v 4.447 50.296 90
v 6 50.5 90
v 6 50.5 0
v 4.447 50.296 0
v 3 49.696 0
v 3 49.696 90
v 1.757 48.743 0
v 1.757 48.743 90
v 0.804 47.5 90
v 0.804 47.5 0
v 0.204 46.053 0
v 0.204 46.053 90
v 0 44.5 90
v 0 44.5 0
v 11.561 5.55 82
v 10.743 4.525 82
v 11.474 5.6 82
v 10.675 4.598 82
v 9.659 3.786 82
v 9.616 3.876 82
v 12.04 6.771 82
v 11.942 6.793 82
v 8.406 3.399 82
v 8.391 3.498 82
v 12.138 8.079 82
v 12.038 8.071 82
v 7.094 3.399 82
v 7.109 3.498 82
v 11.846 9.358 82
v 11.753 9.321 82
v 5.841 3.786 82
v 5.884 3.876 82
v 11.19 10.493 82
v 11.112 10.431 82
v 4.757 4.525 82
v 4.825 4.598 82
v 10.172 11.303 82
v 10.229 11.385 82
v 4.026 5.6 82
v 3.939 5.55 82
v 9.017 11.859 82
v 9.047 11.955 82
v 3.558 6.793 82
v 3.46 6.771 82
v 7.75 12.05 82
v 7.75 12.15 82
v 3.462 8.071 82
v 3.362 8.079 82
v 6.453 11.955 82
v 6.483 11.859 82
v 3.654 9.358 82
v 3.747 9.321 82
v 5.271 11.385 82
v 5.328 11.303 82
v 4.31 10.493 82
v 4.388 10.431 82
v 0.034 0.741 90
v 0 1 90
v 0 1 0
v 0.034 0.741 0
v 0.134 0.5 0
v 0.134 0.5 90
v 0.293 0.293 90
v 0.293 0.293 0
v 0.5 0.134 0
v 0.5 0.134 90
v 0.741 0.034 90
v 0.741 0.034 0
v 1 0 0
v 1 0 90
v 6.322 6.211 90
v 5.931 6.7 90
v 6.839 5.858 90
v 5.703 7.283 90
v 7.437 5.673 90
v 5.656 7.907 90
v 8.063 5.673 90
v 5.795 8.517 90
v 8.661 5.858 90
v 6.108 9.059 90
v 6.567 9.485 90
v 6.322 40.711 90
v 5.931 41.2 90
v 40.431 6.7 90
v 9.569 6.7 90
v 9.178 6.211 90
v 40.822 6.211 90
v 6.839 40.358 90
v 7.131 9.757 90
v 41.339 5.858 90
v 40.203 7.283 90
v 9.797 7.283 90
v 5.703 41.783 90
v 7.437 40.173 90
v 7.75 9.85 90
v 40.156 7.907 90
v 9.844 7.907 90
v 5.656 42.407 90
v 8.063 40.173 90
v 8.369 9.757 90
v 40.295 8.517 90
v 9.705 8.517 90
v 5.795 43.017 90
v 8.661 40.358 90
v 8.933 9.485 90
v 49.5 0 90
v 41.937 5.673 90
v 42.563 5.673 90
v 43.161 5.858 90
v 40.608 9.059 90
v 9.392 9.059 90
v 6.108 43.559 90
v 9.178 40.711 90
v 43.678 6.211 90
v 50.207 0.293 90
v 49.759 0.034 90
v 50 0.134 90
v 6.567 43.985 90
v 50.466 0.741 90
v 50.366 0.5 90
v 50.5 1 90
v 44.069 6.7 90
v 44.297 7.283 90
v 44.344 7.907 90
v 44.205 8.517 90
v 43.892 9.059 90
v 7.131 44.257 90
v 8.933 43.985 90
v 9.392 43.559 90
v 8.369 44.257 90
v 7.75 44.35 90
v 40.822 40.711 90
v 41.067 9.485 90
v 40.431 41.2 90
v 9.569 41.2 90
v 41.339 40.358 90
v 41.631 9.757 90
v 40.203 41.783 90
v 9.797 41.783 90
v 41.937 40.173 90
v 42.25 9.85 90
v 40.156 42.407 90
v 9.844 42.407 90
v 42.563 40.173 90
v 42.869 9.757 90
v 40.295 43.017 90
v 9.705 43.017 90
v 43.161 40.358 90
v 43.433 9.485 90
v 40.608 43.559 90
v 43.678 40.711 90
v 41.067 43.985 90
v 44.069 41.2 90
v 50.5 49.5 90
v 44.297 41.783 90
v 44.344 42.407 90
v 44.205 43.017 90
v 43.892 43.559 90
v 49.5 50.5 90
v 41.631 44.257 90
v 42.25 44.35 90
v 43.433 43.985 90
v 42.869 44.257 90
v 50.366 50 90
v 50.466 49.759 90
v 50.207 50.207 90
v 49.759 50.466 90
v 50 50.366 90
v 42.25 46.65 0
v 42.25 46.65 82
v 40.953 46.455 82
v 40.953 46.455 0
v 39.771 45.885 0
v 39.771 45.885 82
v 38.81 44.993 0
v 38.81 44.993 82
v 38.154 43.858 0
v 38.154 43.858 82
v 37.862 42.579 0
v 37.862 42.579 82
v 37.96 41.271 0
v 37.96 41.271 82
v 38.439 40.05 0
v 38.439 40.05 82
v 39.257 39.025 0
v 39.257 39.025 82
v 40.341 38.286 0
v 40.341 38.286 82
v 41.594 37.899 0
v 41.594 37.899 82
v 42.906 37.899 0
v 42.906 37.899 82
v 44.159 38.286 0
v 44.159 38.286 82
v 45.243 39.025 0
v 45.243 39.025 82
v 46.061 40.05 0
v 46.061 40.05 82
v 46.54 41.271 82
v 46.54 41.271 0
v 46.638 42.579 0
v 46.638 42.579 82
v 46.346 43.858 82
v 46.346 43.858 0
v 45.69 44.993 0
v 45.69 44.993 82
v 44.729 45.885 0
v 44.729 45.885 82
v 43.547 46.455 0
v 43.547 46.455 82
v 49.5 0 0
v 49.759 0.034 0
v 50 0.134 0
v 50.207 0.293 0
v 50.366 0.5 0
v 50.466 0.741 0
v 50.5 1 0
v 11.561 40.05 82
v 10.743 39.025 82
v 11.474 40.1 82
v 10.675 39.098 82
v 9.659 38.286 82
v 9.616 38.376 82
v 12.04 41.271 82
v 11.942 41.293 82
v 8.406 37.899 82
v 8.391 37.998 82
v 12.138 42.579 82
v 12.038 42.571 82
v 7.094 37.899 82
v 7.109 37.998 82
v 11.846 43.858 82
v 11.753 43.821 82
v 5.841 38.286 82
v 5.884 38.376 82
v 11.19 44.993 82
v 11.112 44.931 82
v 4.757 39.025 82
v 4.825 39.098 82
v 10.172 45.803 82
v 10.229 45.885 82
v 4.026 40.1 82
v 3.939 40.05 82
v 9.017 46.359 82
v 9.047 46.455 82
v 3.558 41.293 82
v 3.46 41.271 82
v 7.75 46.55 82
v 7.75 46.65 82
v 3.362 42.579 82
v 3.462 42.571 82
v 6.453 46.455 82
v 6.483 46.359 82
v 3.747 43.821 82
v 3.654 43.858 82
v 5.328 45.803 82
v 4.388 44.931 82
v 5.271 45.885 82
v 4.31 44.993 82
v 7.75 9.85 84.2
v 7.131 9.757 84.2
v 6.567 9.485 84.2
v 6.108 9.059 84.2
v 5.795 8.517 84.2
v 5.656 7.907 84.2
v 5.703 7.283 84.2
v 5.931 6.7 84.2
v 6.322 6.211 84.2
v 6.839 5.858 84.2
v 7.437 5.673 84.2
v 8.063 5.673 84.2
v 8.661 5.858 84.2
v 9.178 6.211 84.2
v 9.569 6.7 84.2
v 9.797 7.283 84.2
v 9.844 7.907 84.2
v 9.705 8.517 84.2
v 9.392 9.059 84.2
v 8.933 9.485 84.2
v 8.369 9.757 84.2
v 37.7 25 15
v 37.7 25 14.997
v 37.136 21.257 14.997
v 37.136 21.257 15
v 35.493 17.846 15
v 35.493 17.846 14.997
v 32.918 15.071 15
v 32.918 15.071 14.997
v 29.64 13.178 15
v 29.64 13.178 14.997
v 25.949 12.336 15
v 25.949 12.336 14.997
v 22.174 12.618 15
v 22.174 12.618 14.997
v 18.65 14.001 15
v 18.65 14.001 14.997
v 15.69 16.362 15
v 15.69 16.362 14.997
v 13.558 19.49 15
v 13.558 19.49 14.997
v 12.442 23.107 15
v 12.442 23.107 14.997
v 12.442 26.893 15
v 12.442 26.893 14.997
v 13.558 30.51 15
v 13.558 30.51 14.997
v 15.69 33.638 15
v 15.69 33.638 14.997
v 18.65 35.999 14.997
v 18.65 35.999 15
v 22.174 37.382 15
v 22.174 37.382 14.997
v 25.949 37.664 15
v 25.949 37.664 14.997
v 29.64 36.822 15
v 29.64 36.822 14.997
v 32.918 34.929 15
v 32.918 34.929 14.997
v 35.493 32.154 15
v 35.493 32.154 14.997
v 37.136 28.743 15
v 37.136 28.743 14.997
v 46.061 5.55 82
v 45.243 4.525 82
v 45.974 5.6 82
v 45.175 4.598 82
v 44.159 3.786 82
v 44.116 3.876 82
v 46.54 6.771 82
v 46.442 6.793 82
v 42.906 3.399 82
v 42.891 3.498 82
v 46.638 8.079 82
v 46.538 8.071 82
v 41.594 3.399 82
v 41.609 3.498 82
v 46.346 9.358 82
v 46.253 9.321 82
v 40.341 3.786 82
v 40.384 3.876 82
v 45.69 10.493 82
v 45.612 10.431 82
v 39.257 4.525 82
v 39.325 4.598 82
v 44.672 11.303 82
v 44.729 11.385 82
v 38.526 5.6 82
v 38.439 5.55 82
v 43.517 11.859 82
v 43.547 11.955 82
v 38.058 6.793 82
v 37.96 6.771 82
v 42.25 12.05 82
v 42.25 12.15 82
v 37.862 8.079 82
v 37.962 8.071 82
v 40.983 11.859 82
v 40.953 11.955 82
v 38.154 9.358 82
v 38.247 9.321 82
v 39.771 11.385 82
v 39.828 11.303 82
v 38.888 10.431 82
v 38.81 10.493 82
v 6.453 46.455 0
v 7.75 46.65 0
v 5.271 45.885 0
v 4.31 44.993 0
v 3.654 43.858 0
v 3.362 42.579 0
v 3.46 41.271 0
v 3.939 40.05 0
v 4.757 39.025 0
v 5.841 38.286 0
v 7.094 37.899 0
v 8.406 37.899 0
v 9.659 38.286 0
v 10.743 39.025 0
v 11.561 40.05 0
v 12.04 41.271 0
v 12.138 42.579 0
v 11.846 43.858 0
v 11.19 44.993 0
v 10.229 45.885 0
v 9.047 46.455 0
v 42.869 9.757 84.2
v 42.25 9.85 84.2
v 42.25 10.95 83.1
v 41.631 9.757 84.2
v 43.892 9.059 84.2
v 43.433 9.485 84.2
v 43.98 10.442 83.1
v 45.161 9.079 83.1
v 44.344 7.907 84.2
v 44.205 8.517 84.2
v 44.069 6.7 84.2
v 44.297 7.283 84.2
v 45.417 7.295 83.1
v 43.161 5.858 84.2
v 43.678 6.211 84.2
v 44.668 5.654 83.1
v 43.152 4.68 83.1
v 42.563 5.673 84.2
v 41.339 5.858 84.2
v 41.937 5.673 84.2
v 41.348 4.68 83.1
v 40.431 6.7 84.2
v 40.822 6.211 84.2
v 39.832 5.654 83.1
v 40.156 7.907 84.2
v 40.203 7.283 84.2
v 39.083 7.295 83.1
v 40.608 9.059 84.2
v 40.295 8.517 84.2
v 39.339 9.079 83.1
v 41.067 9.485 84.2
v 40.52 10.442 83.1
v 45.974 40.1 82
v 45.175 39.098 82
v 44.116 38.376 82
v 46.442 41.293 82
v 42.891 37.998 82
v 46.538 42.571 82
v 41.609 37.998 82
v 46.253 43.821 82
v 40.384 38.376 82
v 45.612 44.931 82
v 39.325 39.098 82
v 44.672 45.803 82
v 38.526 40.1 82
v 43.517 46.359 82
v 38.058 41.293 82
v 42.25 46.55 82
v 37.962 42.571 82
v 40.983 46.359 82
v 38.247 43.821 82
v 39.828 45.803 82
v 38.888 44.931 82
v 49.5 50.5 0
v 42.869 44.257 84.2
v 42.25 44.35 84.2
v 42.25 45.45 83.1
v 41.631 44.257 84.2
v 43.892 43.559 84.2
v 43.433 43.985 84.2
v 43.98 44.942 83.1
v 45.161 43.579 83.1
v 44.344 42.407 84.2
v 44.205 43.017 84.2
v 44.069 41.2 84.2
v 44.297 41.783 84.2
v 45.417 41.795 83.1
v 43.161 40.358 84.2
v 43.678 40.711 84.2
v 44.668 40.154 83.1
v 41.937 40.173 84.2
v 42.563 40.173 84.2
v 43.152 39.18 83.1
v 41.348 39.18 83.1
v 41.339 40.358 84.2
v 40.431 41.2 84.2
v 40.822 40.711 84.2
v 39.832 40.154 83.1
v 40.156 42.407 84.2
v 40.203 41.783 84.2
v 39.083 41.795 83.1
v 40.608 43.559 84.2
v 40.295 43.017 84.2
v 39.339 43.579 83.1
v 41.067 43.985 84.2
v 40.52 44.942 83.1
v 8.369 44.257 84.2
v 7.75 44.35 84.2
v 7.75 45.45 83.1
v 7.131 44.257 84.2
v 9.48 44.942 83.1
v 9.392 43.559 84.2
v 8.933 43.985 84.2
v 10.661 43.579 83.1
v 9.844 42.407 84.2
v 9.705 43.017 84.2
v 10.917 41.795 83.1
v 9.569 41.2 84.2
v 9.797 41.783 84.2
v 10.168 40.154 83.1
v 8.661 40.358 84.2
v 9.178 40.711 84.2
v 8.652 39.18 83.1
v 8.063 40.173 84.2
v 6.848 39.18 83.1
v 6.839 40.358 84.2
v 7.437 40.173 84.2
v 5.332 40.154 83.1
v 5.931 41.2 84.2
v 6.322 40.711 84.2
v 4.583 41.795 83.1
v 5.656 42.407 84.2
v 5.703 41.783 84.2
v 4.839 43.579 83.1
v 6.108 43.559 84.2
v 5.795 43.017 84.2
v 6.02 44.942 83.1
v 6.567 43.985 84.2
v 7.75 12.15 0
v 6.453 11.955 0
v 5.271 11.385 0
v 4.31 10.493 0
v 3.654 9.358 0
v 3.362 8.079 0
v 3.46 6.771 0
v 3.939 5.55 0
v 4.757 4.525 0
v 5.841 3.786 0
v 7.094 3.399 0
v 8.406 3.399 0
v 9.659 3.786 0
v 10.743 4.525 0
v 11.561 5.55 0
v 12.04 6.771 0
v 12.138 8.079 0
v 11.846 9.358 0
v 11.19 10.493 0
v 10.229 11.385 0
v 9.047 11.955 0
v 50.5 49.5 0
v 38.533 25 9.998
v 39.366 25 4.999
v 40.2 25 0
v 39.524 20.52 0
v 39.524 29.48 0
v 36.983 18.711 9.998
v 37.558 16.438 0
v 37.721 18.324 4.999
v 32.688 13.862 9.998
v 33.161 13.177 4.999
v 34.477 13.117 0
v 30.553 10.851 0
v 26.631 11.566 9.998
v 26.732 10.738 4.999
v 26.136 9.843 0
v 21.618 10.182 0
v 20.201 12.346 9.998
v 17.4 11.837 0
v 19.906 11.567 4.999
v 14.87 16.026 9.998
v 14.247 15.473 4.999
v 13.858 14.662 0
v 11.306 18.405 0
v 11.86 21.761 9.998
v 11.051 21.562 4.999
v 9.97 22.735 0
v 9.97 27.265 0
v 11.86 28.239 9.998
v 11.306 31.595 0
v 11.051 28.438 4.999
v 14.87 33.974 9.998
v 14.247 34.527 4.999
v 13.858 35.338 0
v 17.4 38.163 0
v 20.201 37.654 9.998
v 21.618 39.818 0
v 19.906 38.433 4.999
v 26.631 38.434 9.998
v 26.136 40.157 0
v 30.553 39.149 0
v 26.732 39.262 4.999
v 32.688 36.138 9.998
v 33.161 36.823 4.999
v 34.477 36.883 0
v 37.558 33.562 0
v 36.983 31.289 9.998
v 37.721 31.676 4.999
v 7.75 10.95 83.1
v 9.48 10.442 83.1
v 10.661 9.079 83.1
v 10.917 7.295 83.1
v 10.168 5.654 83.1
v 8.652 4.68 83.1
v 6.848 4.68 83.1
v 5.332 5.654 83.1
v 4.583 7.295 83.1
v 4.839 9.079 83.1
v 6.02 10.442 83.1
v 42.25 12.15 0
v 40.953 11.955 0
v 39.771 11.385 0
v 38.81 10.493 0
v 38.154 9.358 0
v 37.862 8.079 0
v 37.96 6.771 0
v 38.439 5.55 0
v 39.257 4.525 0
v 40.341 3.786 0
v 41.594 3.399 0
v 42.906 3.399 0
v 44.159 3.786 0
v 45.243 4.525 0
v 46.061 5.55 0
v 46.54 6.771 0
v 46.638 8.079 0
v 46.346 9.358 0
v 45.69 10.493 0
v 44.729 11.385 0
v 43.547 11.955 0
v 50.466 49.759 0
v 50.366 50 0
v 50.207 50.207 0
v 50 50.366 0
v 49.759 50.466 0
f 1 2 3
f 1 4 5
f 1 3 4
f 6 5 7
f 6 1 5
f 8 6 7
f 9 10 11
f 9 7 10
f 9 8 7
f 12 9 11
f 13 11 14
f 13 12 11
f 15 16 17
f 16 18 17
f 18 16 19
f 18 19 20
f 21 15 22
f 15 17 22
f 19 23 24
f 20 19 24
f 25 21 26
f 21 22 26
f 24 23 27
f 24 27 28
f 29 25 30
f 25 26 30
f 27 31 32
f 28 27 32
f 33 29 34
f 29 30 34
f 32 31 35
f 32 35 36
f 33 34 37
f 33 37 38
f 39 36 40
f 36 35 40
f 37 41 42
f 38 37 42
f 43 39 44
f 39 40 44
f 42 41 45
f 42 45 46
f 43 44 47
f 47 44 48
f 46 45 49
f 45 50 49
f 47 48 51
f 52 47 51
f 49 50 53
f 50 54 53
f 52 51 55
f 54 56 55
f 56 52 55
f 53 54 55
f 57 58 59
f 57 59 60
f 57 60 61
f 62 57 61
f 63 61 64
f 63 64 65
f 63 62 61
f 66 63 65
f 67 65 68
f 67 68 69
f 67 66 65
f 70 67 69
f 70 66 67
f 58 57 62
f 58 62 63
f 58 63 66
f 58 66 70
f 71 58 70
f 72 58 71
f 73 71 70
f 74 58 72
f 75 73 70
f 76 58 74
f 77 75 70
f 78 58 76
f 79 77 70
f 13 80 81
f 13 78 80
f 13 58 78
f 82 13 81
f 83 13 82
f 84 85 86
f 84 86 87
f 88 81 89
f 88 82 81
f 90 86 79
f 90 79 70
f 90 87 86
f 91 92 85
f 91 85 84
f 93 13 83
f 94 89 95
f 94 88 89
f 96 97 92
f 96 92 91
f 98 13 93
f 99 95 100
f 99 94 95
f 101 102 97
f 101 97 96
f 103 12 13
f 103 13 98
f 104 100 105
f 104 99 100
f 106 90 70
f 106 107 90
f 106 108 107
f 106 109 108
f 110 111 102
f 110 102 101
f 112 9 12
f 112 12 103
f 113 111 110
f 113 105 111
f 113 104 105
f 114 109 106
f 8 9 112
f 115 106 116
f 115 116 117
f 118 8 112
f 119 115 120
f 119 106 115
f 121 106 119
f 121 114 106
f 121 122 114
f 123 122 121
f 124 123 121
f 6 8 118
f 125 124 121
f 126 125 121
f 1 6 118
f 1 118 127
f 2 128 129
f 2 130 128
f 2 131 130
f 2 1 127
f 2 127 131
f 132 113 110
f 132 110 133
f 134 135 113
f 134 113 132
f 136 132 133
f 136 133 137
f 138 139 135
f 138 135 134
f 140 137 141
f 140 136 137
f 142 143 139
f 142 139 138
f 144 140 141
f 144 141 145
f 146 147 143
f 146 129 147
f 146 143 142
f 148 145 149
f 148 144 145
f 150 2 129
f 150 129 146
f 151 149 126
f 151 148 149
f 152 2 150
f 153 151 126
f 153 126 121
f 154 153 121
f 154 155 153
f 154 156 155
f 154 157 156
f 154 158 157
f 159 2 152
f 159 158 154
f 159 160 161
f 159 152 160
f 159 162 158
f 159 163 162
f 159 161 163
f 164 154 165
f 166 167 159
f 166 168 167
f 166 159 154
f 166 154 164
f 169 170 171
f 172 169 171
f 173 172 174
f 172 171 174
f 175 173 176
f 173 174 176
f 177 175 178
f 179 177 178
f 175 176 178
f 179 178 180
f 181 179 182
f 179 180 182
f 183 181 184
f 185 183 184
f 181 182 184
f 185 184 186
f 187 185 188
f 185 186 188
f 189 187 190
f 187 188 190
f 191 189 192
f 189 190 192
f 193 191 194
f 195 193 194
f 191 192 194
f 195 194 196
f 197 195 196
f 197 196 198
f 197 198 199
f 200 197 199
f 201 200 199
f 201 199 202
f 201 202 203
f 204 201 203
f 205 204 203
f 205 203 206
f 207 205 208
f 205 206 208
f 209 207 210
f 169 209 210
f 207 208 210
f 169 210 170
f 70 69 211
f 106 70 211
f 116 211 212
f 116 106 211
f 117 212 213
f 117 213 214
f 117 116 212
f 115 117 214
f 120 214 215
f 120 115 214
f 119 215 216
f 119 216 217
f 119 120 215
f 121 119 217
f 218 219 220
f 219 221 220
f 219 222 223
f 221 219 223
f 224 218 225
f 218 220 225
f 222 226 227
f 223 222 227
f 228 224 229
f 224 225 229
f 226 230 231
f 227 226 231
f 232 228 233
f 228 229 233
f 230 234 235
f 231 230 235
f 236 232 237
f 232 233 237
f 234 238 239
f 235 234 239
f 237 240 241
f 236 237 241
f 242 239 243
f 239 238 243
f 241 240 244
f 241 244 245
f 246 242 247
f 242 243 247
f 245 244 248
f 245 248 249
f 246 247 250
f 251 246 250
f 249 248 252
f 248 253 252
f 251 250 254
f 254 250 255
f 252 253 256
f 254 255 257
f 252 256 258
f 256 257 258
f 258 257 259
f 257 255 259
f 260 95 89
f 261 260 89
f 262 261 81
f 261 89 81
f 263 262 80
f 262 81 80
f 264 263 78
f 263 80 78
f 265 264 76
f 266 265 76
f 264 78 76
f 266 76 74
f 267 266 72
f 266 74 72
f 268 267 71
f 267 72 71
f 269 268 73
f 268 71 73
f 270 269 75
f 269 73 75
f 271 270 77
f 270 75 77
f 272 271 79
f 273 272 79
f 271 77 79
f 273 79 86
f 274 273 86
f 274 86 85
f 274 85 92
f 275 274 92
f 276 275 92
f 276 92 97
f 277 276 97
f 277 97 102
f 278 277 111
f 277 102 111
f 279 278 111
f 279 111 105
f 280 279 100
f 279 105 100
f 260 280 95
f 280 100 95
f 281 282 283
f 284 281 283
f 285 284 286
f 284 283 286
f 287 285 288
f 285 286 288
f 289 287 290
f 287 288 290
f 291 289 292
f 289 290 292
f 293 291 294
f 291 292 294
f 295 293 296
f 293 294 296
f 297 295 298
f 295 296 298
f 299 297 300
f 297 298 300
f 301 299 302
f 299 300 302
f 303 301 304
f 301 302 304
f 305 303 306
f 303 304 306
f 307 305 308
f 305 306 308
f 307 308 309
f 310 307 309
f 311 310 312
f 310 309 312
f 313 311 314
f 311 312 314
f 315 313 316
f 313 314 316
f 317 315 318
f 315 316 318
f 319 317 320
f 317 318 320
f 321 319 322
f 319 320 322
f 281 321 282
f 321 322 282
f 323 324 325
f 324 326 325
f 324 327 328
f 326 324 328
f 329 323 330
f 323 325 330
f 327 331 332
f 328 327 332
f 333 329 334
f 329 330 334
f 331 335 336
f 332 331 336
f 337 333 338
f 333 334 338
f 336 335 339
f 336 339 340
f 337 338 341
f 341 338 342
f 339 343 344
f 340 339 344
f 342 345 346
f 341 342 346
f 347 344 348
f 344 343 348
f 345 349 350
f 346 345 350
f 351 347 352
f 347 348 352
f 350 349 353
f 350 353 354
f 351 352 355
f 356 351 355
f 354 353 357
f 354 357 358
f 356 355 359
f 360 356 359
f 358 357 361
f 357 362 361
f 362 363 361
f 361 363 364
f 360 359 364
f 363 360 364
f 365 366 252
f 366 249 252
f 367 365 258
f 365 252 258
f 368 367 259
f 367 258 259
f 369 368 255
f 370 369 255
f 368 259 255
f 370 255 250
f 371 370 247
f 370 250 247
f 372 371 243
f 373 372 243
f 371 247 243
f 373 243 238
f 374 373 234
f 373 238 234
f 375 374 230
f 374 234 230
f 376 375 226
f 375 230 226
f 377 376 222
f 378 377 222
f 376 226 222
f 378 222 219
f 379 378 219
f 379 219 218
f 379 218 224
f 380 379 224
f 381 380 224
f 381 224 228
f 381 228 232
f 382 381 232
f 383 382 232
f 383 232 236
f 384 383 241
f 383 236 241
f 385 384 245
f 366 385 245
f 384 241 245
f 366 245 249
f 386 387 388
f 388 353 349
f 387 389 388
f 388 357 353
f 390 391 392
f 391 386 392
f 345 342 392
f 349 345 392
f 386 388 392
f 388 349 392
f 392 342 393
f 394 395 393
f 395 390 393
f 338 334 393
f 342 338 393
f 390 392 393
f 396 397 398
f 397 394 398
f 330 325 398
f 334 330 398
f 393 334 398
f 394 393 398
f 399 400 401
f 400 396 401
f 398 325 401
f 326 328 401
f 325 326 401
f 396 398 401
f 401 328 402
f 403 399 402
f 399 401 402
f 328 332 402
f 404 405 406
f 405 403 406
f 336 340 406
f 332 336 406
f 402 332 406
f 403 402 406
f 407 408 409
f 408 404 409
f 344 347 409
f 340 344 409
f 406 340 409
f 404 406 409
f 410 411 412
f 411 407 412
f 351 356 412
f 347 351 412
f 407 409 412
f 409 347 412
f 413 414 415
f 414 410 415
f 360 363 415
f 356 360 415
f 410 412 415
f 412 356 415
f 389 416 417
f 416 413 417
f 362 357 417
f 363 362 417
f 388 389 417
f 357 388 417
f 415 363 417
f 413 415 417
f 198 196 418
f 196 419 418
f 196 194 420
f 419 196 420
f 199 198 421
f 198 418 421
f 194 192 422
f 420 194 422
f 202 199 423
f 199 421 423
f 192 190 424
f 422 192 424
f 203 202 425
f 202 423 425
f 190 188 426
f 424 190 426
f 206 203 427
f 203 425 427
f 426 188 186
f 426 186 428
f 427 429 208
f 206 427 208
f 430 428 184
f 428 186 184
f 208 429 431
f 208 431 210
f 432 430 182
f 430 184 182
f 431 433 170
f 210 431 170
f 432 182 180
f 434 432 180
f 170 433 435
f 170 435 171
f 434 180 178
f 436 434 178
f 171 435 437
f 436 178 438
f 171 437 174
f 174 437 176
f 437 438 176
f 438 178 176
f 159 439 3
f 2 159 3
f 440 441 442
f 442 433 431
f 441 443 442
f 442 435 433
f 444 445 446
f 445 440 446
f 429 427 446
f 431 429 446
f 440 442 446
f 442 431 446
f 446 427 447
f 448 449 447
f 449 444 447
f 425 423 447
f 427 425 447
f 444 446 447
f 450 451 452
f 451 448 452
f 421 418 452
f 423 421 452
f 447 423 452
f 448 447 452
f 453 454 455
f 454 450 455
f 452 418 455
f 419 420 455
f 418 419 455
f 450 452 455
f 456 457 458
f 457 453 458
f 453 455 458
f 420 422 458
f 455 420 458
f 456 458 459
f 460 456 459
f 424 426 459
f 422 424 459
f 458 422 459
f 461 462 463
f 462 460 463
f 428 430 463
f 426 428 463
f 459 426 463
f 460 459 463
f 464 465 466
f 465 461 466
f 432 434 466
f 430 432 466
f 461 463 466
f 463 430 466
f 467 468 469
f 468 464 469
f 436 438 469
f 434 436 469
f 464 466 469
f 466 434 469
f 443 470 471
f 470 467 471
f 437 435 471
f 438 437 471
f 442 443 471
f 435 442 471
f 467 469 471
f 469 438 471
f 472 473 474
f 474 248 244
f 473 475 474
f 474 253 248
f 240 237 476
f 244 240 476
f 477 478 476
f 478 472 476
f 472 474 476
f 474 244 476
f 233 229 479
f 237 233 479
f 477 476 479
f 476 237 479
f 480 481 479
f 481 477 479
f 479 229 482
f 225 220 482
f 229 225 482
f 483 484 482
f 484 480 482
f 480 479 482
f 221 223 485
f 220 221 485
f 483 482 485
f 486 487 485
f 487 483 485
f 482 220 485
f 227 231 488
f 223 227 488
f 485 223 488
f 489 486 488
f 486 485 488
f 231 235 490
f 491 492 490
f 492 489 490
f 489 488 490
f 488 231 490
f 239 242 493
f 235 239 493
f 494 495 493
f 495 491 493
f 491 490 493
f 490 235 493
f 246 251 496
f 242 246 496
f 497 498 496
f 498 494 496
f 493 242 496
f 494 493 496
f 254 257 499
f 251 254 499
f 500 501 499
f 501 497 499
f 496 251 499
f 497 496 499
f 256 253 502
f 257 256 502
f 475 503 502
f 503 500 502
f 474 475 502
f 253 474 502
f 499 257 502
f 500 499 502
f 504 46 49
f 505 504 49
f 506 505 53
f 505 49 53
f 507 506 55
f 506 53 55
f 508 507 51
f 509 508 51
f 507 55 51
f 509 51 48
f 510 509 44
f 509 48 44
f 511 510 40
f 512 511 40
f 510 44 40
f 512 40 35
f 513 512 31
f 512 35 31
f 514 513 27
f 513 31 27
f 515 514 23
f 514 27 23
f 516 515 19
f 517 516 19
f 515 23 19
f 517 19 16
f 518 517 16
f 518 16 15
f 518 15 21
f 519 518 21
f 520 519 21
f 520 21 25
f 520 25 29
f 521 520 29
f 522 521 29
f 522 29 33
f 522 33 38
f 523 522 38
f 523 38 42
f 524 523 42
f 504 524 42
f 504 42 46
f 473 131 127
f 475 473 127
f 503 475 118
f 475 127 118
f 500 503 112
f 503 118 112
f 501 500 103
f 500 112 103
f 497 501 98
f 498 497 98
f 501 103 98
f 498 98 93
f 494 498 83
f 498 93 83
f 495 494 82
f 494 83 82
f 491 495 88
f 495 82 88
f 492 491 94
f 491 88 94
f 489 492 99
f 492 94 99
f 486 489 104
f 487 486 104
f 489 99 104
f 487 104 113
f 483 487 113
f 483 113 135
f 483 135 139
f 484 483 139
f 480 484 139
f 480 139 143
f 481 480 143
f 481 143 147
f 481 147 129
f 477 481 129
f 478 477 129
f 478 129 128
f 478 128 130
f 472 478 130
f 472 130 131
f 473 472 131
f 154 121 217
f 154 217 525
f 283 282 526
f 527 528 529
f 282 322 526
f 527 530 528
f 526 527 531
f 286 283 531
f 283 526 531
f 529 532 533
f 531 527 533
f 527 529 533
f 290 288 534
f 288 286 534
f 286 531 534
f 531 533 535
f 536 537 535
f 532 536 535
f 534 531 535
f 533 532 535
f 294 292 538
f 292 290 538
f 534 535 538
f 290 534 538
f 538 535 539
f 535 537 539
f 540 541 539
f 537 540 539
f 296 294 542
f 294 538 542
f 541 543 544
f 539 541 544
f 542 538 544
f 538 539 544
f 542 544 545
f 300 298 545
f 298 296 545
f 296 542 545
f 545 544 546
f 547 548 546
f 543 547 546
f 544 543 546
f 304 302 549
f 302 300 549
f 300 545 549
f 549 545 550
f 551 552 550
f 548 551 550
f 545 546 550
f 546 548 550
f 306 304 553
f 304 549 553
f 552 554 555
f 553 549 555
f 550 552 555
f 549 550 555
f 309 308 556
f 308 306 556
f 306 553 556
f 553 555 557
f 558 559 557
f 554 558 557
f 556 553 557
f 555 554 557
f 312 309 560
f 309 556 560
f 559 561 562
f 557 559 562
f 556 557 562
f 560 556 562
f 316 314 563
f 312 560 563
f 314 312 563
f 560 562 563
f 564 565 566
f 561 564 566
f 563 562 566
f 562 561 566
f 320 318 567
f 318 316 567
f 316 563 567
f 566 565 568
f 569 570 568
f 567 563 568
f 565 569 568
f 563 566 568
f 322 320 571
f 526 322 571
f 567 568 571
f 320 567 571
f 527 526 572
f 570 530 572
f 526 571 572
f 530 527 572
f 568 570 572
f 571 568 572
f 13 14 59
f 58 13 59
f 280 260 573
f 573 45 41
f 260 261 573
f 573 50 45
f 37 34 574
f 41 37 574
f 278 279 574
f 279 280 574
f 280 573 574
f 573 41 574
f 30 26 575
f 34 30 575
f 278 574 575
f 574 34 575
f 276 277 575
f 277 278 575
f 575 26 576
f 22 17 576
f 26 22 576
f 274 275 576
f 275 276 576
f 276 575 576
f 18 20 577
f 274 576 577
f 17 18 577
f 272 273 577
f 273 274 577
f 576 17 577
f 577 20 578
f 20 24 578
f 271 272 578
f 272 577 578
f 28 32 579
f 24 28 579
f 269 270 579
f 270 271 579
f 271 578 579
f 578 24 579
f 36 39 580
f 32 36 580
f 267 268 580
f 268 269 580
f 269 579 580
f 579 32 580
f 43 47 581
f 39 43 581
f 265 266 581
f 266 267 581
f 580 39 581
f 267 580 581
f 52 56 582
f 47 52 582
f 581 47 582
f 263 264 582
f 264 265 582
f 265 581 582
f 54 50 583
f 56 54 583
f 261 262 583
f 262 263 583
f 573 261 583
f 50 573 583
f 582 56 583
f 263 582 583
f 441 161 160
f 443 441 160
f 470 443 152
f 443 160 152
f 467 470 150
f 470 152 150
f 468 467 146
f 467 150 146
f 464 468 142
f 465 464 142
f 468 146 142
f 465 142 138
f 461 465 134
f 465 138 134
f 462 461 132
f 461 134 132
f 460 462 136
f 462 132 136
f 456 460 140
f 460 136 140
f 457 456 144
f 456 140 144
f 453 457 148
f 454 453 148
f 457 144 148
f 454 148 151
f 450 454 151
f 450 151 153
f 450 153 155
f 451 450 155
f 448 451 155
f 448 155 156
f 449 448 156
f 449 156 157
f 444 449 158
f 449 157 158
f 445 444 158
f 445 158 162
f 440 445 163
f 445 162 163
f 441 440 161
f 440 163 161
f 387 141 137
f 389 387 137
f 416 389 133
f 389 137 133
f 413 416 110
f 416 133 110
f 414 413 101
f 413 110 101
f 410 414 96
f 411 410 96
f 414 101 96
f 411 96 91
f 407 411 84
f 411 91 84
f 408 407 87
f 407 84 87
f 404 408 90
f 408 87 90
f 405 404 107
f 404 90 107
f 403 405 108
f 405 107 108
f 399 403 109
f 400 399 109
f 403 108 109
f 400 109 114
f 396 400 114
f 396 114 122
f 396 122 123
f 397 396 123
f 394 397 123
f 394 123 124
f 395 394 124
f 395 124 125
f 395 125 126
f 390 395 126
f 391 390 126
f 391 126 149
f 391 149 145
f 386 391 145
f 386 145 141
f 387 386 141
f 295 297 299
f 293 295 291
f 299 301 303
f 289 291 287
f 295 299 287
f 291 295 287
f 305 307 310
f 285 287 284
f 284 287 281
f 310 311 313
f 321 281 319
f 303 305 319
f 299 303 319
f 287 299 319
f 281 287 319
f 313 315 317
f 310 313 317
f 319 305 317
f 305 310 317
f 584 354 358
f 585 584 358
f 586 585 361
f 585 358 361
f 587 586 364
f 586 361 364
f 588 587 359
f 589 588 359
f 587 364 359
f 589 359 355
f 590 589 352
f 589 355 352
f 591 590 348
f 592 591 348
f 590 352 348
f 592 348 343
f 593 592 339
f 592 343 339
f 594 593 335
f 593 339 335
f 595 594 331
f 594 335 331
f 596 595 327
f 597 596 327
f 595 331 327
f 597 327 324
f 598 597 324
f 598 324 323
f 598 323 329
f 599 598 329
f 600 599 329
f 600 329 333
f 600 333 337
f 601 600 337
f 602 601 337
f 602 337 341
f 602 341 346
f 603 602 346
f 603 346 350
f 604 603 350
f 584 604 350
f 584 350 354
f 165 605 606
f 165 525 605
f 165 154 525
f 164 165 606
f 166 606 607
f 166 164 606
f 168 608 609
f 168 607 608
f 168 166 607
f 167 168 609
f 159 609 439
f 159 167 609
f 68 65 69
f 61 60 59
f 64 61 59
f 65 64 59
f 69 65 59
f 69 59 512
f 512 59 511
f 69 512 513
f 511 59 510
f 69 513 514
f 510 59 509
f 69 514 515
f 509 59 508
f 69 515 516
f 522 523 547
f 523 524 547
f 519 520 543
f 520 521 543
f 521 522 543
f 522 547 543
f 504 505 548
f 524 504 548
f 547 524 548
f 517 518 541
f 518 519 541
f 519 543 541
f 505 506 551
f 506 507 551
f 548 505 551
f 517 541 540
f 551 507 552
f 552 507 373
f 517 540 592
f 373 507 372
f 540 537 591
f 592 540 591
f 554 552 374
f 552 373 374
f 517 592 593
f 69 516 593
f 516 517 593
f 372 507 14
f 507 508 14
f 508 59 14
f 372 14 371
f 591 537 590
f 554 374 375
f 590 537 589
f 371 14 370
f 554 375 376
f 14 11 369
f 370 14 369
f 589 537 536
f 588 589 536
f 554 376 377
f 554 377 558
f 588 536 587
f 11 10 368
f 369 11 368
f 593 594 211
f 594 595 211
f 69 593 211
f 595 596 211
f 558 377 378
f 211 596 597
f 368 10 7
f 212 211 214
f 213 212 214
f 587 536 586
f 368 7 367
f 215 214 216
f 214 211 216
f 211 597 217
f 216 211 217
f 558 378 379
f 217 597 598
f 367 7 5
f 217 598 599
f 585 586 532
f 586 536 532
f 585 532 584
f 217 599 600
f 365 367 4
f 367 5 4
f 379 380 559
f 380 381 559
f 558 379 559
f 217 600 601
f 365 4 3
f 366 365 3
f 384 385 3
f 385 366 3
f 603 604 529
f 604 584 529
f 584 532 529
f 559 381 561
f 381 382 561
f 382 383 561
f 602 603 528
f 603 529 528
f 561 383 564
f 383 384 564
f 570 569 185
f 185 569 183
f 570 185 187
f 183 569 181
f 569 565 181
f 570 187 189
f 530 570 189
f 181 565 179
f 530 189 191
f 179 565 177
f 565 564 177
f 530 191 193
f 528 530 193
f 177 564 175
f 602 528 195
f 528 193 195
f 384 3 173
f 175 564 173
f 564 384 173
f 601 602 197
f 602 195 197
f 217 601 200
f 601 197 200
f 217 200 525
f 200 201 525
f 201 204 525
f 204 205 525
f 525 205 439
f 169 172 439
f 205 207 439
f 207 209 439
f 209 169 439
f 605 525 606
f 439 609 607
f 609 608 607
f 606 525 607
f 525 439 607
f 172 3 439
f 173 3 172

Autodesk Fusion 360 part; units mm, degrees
sketch "Skizze1" plane through (0, 0, 0) normal (0, 0, 1) x (1, 0, 0)
  line L0 (0, 0) -> (50.5, 0)
  line L1 (50.5, 0) -> (50.5, 50.5)
  line L2 (50.5, 50.5) -> (0, 50.5)
  line L3 (0, 50.5) -> (0, 0)
  line L4 (50.5, 0) -> (50.5, 5)
  line L5 (50.5, 5) -> (50.5, 8.5)
  line L6 (50.5, 8.5) -> (50.5, 13.5)
  circle A0 centre (25, 25) radius 12.7
  line L7 (42.25, 42.25) -> (7.75, 42.25)
  line L8 (7.75, 42.25) -> (7.75, 7.75)
  line L9 (7.75, 7.75) -> (42.25, 7.75)
  line L10 (42.25, 7.75) -> (42.25, 42.25)
  line L11 (42.25, 42.25) -> (7.75, 7.75) construction
  line L12 (7.75, 42.25) -> (42.25, 7.75) construction
  point P0 (25, 25)
  dimension "d1" = 50.5
  dimension "d2" = 50.5
  dimension "d17" = 25.4
  dimension "d18" = 34.5
  dimension "d19" = 34.5
extrude "Extrusion1" add sketch "Skizze1" along normal blind 90 contours L0 L1 L2 L3 L4 L5 L6 | A0 | L7 L8 L9 L10
extrude "Extrusion2" cut sketch "Skizze1" along normal blind 15 contours A0
chamfer "Fase1" distance 2.5 distance2 15 1 edges at (13.1594, 20.4075, 0) measured on face at (25.483, 46.2215, 0)
sketch "Skizze2" plane through (0, 0, 0) normal (0, 0, -1) x (1, 0, 0)
  line L0 (0, 0) -> (0, -50.5)
  line L1 (0, -50.5) -> (50.5, -50.5)
  line L2 (50.5, -50.5) -> (50.5, 0)
  line L3 (50.5, 0) -> (0, 0)
  circle A0 centre (25, -25) radius 15.2
  line L4 (42.25, -7.75) -> (7.75, -7.75)
  line L5 (7.75, -7.75) -> (7.75, -42.25)
  line L6 (7.75, -42.25) -> (42.25, -42.25)
  line L7 (42.25, -42.25) -> (42.25, -7.75)
  line L8 (42.25, -7.75) -> (7.75, -42.25) construction
  line L9 (7.75, -7.75) -> (42.25, -42.25) construction
  point P0 (25, -25)
  dimension "d26" = 34.5
  dimension "d27" = 34.5
hole "Bohrung1" at (7.75, 7.75, 0) at (7.75, 42.25, 0) at (42.25, 42.25, 0) at (42.25, 7.75, 0) direction (0, 0, 1) diameter 8.8 depth 82 tip angle 180
hole "Bohrung2" at (7.75, 42.25, 82) direction (0, 0, 1) diameter 4.2 depth 82 tip angle 180 countersink diameter 8.6 countersink angle 90
hole "Bohrung3" at (7.75, 7.75, 82) direction (0, 0, 1) diameter 4.2 depth 82 tip angle 180 countersink diameter 8.6 countersink angle 90
hole "Bohrung4" at (42.25, 7.75, 82) direction (0, 0, 1) diameter 4.2 depth 82 tip angle 180 countersink diameter 8.6 countersink angle 90
hole "Bohrung5" at (42.25, 42.25, 82) direction (0, 0, 1) diameter 4.2 depth 82 tip angle 180 countersink diameter 8.6 countersink angle 90
fillet "Fillet3" radius 6 1 edges at (0, 50.5, 45)
fillet "Fillet4" radius 1 3 edges at (0, 0, 45) (50.5, 0, 45) (50.5, 50.5, 45)
